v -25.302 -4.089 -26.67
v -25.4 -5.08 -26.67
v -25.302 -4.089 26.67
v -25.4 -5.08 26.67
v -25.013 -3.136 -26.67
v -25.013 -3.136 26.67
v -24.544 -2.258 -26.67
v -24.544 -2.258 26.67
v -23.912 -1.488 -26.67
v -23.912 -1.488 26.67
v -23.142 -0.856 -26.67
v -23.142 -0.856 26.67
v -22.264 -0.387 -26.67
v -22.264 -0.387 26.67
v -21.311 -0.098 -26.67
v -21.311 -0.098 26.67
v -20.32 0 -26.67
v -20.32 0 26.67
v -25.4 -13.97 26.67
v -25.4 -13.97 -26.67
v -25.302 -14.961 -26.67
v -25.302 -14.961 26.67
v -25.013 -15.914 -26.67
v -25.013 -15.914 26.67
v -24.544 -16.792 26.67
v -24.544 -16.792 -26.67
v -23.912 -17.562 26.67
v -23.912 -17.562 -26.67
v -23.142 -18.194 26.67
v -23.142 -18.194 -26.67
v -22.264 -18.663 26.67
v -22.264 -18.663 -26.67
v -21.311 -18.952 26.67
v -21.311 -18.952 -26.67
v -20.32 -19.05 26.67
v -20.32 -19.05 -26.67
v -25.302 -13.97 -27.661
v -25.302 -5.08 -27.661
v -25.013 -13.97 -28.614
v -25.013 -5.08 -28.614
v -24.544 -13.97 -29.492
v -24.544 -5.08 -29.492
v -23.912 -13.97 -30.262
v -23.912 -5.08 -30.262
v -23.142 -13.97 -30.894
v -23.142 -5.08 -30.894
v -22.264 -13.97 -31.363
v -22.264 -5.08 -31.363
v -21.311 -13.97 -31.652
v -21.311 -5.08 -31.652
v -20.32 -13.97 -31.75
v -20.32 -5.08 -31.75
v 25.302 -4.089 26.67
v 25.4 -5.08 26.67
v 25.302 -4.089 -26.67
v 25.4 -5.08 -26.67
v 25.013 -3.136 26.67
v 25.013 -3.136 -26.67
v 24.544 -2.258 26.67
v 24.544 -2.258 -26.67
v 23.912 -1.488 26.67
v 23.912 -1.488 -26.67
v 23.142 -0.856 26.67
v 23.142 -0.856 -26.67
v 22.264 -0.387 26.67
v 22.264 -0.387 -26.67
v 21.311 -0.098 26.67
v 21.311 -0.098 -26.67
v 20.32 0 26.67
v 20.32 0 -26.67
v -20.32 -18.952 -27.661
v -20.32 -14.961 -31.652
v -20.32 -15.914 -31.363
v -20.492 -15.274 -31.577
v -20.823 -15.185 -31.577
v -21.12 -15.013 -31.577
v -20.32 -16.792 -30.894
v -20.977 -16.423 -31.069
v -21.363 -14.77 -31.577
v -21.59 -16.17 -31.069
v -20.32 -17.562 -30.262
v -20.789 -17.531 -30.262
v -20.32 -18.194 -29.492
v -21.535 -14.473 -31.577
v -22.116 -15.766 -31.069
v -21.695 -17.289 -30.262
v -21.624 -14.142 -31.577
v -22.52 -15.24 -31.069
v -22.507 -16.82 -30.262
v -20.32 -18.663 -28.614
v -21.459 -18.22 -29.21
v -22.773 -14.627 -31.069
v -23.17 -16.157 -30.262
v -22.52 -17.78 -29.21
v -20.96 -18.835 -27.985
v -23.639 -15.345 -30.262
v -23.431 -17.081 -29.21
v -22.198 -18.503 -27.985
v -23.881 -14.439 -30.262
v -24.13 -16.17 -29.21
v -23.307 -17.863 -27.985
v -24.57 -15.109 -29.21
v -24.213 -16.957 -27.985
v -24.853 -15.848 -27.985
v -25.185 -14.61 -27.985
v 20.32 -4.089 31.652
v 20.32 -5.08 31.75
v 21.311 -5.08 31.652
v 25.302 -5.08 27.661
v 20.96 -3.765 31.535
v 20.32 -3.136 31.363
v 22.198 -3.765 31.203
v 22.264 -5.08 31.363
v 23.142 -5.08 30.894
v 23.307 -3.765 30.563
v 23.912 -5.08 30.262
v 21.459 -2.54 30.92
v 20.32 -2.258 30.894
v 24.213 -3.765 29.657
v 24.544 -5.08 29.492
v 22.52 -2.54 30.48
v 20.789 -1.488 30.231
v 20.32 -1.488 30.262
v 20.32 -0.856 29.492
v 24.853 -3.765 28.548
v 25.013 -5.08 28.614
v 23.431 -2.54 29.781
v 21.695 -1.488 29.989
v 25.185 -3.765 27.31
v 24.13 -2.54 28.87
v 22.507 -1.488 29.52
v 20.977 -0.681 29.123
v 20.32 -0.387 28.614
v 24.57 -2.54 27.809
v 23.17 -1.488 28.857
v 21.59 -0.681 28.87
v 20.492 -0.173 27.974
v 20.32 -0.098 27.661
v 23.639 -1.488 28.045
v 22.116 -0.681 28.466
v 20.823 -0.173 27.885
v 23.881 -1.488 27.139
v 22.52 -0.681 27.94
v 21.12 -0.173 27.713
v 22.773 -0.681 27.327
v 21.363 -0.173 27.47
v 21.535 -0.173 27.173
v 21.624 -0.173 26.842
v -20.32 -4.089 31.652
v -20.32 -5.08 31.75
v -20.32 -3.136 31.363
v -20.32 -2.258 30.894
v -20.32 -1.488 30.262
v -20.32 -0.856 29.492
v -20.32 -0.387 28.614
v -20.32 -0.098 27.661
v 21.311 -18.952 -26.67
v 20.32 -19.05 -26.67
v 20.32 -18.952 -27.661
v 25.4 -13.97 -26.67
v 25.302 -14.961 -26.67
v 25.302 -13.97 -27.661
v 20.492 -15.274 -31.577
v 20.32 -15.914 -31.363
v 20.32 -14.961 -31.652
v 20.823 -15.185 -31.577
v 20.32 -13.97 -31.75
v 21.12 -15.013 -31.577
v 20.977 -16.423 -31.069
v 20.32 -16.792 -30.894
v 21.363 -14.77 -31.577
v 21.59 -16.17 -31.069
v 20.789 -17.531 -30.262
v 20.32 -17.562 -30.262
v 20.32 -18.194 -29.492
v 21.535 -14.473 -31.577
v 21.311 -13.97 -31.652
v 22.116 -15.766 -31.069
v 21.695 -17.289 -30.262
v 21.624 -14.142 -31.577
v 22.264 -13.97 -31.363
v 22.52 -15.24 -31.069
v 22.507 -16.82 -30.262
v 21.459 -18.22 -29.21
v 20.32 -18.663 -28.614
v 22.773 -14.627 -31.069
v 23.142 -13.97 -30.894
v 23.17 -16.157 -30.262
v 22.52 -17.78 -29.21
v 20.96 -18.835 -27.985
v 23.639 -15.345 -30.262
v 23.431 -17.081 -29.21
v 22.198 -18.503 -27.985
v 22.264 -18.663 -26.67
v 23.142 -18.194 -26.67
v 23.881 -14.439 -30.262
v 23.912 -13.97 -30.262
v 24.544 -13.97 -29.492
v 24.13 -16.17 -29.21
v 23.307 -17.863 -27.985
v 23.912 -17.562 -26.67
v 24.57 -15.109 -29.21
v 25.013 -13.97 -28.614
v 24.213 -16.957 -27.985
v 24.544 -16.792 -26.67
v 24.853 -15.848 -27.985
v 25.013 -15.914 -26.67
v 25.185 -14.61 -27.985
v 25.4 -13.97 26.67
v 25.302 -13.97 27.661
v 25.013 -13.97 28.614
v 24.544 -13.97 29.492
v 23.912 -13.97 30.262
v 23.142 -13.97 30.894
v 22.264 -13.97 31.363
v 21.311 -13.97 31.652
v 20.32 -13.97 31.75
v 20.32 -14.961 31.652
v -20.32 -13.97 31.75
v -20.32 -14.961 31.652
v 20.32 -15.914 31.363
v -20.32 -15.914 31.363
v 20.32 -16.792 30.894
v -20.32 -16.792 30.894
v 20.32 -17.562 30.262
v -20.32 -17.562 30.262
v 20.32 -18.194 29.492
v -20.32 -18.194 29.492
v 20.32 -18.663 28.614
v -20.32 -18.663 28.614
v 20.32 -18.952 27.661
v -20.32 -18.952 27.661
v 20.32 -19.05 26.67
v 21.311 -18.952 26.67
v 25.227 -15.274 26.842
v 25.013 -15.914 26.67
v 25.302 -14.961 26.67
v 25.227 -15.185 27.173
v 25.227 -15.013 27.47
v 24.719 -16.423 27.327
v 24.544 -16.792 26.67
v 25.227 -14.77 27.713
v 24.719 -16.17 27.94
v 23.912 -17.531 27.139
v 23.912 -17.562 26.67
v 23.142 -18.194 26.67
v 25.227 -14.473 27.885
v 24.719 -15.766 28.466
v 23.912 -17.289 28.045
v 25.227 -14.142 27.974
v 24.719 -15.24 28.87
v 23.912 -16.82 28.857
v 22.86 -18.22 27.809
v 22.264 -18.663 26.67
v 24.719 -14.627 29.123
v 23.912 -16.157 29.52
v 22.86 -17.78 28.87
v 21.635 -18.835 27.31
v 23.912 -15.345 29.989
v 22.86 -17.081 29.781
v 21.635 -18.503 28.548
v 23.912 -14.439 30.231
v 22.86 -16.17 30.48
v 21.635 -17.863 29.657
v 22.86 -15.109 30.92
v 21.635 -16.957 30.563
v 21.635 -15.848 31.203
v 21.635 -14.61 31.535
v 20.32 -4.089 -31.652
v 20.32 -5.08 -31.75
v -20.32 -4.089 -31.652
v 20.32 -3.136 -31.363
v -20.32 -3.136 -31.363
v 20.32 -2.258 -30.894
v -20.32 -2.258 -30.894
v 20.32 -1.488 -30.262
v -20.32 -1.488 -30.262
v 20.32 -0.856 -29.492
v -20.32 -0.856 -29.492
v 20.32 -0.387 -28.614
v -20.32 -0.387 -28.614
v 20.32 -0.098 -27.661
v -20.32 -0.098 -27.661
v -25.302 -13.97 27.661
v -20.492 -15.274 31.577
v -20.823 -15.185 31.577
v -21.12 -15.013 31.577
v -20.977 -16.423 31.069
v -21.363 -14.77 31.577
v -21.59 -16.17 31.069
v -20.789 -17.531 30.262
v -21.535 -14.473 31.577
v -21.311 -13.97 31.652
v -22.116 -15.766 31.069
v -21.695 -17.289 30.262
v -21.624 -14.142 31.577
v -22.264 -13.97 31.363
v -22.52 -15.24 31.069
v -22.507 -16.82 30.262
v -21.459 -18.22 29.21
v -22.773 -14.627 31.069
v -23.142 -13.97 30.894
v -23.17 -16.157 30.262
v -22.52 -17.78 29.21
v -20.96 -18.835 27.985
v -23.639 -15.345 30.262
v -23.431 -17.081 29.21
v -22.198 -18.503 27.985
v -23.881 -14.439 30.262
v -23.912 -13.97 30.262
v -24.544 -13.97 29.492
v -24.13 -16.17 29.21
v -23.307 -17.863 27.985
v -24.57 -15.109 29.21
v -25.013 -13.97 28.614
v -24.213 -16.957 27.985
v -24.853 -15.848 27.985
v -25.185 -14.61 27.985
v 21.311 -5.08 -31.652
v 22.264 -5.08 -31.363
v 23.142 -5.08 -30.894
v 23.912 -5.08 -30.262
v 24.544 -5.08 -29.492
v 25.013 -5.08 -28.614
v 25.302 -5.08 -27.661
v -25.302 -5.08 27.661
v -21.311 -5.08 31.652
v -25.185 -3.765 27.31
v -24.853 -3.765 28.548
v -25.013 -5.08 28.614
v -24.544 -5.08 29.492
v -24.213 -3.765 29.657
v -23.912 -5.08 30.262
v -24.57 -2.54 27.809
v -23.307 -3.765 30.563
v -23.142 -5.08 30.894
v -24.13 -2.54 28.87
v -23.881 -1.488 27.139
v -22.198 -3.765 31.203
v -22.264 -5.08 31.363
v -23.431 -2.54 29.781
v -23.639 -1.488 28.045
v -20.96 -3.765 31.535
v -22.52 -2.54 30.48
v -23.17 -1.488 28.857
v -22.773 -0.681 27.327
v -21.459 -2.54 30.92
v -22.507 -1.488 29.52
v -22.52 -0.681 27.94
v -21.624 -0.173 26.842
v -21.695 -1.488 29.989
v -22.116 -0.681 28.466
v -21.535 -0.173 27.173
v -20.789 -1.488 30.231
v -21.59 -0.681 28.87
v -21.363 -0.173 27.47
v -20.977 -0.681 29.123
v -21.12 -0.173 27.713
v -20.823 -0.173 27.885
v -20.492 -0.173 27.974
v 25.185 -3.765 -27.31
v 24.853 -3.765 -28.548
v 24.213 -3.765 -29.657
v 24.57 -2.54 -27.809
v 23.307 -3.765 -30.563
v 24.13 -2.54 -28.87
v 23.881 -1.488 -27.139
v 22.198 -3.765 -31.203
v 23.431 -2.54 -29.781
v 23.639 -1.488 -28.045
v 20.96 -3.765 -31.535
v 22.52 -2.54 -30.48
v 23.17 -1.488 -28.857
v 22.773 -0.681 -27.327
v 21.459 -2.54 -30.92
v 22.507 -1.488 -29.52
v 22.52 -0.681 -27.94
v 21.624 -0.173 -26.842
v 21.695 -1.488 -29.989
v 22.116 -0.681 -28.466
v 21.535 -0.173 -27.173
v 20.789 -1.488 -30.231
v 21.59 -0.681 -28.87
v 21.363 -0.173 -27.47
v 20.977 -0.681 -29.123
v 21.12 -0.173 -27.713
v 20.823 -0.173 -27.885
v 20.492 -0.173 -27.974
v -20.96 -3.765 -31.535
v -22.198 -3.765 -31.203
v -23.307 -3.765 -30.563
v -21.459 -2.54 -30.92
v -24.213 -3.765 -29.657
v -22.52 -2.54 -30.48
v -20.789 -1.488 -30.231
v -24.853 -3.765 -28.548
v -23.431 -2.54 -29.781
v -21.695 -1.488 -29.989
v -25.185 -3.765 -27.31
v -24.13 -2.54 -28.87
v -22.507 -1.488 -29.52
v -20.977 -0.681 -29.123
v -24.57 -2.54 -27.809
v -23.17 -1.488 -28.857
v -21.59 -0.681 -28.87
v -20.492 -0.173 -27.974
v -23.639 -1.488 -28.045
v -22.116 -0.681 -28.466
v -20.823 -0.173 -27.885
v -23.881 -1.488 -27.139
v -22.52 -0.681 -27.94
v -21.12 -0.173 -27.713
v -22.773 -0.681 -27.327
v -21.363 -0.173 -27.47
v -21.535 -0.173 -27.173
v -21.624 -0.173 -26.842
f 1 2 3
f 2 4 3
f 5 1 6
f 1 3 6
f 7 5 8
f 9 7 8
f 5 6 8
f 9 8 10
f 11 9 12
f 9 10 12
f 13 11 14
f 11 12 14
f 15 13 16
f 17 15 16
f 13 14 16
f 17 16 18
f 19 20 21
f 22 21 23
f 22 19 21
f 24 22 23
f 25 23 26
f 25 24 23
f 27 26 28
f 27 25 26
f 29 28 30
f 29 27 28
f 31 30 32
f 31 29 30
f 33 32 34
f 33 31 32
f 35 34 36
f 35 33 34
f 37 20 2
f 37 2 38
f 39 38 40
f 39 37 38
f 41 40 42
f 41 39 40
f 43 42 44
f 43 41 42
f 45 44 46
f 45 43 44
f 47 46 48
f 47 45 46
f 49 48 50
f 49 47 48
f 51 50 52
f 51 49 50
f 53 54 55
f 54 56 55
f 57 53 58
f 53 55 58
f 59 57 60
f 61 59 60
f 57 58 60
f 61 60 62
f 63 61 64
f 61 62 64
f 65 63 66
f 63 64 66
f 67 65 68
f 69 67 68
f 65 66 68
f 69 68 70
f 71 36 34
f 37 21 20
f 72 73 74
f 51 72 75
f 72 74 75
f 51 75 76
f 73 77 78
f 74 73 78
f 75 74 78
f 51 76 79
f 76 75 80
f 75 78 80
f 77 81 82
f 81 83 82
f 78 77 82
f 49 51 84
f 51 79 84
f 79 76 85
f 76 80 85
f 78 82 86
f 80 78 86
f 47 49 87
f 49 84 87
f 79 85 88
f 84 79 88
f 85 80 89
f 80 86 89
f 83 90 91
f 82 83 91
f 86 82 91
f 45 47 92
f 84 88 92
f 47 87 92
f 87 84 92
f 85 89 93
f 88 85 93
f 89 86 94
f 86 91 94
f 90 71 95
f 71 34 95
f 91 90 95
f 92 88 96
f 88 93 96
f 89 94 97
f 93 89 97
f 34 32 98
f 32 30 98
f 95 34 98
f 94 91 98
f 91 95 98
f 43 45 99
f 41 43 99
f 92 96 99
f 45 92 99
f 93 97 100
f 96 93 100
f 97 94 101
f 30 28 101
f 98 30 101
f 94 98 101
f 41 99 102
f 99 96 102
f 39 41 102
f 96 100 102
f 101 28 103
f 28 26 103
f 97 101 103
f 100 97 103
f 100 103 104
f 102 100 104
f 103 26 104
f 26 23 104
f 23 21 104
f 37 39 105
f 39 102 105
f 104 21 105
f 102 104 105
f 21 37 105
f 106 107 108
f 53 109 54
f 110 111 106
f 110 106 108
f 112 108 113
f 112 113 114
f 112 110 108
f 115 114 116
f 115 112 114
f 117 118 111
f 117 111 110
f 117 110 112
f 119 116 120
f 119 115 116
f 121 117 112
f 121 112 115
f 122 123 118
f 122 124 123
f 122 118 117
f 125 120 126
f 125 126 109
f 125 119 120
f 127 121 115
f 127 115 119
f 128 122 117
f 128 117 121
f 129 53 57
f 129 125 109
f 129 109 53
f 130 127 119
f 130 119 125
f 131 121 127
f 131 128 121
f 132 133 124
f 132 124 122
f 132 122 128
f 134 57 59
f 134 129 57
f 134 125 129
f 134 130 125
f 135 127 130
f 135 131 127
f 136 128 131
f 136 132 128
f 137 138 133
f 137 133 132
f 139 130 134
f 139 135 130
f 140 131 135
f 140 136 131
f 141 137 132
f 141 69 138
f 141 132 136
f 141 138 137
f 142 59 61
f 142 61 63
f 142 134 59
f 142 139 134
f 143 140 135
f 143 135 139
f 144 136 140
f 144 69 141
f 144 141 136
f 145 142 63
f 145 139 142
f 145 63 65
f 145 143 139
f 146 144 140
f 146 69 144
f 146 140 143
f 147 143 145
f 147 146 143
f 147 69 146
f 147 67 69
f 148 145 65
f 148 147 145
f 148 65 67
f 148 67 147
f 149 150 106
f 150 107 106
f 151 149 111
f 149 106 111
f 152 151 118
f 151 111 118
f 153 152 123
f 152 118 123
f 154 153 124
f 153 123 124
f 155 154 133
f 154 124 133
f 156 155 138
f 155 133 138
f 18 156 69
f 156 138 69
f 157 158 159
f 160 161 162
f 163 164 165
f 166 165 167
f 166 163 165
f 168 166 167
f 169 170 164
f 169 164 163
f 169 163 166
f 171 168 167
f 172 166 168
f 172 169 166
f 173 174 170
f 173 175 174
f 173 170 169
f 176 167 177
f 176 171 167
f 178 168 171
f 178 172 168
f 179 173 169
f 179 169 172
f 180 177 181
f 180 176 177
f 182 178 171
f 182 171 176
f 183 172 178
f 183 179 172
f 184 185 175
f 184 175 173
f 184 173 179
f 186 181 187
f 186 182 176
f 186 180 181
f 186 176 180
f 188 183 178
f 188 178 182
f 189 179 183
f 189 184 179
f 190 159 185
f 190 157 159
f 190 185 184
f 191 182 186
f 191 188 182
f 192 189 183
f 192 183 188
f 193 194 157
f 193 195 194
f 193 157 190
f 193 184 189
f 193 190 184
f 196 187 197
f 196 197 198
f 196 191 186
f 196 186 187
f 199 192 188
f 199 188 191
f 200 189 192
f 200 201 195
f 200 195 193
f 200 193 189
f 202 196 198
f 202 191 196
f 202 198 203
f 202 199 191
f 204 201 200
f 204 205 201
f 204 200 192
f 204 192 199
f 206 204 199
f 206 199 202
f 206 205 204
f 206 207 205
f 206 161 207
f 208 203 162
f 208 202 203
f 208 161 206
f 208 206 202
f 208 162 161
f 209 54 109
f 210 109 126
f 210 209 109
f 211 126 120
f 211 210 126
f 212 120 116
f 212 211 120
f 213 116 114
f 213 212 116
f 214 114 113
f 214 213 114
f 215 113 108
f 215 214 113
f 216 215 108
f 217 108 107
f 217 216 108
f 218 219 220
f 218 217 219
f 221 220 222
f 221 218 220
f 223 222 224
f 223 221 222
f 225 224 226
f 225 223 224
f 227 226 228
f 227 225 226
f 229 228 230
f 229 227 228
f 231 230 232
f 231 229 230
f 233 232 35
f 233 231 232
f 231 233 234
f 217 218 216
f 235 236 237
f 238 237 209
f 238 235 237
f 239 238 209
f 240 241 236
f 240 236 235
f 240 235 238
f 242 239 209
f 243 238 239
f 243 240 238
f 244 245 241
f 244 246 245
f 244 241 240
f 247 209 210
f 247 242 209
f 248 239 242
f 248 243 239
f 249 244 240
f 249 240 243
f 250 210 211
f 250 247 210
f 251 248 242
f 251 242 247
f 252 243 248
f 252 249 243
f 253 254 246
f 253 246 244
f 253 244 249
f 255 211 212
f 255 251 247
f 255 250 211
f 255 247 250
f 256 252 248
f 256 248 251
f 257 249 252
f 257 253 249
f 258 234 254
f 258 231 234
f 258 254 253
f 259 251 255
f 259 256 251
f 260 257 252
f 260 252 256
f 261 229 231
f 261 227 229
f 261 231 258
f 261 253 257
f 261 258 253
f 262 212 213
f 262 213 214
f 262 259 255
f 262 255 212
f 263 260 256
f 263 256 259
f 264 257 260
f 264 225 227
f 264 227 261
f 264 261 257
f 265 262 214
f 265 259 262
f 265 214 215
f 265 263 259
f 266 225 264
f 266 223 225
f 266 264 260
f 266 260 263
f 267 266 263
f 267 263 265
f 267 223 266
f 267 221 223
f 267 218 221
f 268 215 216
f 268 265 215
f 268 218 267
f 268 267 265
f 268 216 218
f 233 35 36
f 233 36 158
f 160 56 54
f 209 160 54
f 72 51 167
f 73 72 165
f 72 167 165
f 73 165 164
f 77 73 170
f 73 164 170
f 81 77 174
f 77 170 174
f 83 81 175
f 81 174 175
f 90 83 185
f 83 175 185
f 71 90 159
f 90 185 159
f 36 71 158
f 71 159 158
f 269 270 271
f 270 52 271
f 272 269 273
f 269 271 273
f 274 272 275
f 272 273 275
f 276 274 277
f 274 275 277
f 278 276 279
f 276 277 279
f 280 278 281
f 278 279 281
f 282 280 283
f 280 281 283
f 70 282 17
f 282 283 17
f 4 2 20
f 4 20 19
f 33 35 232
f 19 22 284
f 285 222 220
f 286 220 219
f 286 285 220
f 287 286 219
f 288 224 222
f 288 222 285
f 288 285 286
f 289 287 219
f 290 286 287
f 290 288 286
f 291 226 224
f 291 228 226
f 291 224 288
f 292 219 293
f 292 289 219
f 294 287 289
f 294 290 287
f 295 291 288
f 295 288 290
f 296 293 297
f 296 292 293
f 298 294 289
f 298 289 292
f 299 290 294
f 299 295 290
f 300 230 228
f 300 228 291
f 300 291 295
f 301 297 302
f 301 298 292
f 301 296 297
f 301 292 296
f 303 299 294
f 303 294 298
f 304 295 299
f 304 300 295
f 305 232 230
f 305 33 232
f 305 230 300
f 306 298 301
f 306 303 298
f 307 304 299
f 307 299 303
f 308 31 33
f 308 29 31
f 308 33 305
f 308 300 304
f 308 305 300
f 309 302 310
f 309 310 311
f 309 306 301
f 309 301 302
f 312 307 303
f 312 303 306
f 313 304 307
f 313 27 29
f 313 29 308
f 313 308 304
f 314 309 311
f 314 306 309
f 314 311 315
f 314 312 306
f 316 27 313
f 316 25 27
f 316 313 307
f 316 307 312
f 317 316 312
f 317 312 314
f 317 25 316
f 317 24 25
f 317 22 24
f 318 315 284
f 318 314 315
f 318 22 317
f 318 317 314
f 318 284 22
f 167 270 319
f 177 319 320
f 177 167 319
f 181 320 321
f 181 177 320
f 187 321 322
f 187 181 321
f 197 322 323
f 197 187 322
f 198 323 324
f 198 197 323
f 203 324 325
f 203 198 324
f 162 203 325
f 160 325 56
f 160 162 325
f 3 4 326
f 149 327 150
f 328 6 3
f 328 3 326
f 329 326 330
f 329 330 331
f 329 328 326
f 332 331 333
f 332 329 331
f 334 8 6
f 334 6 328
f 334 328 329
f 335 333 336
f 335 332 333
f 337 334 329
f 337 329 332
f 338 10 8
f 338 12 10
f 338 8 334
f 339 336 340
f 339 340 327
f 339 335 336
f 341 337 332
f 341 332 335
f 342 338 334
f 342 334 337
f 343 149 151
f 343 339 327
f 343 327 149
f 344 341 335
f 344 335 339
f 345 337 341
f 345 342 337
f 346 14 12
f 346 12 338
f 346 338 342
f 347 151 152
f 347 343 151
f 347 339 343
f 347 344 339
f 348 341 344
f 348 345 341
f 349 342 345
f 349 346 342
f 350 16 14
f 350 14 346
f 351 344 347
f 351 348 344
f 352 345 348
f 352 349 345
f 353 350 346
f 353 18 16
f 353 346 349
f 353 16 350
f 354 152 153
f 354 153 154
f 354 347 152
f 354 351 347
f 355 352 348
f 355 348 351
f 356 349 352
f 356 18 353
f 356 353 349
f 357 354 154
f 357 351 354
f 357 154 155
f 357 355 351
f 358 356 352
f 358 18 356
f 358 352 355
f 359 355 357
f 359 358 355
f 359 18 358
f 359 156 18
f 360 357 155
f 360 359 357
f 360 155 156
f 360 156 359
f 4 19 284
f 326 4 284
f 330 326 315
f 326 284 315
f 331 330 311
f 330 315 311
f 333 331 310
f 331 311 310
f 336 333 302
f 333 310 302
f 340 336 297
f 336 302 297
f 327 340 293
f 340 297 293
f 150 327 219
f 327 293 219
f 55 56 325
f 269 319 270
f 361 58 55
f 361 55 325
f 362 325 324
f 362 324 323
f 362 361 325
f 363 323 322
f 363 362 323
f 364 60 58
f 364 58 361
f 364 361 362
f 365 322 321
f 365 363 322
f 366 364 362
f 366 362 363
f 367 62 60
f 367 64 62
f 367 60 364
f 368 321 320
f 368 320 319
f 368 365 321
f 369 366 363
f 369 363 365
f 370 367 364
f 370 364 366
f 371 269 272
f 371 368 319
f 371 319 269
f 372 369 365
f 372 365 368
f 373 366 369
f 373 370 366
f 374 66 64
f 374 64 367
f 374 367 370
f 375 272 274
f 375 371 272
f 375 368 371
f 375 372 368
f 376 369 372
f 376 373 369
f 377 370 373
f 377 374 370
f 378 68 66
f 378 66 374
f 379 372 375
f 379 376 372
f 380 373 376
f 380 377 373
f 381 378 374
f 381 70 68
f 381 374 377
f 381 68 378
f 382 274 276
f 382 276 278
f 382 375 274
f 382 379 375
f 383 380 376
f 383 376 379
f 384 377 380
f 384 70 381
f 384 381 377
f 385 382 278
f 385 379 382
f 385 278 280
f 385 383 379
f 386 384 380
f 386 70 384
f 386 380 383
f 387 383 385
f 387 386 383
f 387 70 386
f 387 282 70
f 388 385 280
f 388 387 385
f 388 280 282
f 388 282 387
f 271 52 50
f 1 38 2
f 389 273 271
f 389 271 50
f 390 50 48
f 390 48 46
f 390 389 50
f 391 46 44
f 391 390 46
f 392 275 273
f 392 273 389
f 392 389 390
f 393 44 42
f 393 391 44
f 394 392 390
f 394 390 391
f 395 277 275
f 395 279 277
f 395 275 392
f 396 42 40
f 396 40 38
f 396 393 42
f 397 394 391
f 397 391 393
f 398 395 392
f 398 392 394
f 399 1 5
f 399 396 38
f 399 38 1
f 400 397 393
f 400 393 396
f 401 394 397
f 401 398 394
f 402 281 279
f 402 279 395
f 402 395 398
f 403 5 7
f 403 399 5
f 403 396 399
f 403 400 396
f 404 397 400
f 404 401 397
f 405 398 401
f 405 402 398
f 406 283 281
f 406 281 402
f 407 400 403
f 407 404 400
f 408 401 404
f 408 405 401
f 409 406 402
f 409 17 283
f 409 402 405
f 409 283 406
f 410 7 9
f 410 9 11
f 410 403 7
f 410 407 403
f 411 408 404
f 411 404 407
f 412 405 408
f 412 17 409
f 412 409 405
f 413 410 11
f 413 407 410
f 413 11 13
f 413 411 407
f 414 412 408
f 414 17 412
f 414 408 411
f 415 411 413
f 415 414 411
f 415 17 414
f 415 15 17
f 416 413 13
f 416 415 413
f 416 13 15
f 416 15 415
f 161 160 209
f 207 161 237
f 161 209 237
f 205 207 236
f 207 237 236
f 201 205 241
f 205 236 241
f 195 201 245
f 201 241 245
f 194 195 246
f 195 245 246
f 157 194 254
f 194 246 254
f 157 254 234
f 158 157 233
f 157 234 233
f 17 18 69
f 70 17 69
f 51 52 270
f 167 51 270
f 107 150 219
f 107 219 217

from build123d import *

# Parameters (mm, degrees)
F0_W     = 50.8
F0_H     = 63.5
F1_DEPTH = 19.05
F2_R     = 5.08
F3_R     = 5.08


with BuildPart() as f1:
    # F0 (on Front) → F1 (new body)
    with BuildSketch(Plane.XZ):
        Rectangle(F0_W, F0_H)
    extrude(amount=F1_DEPTH)

    # F2
    f2_edges = [f1.edges().sort_by_distance(p)[0] for p in [
        (-25.4, -19.05, 0),
        (0, -19.05, 31.75),
        (25.4, -19.05, 0),
        (0, -19.05, -31.75),
        (25.4, -9.525, -31.75),
        (-25.4, -9.525, -31.75),
        (25.4, -9.525, 31.75),
        (-25.4, -9.525, 31.75),
    ]]
    fillet(f2_edges, radius=F2_R)

    # F3
    f3_edges = [f1.edges().sort_by_distance(p)[0] for p in [
        (-25.4, 0, 0),
    ]]
    fillet(f3_edges, radius=F3_R)


solid = f1.part
